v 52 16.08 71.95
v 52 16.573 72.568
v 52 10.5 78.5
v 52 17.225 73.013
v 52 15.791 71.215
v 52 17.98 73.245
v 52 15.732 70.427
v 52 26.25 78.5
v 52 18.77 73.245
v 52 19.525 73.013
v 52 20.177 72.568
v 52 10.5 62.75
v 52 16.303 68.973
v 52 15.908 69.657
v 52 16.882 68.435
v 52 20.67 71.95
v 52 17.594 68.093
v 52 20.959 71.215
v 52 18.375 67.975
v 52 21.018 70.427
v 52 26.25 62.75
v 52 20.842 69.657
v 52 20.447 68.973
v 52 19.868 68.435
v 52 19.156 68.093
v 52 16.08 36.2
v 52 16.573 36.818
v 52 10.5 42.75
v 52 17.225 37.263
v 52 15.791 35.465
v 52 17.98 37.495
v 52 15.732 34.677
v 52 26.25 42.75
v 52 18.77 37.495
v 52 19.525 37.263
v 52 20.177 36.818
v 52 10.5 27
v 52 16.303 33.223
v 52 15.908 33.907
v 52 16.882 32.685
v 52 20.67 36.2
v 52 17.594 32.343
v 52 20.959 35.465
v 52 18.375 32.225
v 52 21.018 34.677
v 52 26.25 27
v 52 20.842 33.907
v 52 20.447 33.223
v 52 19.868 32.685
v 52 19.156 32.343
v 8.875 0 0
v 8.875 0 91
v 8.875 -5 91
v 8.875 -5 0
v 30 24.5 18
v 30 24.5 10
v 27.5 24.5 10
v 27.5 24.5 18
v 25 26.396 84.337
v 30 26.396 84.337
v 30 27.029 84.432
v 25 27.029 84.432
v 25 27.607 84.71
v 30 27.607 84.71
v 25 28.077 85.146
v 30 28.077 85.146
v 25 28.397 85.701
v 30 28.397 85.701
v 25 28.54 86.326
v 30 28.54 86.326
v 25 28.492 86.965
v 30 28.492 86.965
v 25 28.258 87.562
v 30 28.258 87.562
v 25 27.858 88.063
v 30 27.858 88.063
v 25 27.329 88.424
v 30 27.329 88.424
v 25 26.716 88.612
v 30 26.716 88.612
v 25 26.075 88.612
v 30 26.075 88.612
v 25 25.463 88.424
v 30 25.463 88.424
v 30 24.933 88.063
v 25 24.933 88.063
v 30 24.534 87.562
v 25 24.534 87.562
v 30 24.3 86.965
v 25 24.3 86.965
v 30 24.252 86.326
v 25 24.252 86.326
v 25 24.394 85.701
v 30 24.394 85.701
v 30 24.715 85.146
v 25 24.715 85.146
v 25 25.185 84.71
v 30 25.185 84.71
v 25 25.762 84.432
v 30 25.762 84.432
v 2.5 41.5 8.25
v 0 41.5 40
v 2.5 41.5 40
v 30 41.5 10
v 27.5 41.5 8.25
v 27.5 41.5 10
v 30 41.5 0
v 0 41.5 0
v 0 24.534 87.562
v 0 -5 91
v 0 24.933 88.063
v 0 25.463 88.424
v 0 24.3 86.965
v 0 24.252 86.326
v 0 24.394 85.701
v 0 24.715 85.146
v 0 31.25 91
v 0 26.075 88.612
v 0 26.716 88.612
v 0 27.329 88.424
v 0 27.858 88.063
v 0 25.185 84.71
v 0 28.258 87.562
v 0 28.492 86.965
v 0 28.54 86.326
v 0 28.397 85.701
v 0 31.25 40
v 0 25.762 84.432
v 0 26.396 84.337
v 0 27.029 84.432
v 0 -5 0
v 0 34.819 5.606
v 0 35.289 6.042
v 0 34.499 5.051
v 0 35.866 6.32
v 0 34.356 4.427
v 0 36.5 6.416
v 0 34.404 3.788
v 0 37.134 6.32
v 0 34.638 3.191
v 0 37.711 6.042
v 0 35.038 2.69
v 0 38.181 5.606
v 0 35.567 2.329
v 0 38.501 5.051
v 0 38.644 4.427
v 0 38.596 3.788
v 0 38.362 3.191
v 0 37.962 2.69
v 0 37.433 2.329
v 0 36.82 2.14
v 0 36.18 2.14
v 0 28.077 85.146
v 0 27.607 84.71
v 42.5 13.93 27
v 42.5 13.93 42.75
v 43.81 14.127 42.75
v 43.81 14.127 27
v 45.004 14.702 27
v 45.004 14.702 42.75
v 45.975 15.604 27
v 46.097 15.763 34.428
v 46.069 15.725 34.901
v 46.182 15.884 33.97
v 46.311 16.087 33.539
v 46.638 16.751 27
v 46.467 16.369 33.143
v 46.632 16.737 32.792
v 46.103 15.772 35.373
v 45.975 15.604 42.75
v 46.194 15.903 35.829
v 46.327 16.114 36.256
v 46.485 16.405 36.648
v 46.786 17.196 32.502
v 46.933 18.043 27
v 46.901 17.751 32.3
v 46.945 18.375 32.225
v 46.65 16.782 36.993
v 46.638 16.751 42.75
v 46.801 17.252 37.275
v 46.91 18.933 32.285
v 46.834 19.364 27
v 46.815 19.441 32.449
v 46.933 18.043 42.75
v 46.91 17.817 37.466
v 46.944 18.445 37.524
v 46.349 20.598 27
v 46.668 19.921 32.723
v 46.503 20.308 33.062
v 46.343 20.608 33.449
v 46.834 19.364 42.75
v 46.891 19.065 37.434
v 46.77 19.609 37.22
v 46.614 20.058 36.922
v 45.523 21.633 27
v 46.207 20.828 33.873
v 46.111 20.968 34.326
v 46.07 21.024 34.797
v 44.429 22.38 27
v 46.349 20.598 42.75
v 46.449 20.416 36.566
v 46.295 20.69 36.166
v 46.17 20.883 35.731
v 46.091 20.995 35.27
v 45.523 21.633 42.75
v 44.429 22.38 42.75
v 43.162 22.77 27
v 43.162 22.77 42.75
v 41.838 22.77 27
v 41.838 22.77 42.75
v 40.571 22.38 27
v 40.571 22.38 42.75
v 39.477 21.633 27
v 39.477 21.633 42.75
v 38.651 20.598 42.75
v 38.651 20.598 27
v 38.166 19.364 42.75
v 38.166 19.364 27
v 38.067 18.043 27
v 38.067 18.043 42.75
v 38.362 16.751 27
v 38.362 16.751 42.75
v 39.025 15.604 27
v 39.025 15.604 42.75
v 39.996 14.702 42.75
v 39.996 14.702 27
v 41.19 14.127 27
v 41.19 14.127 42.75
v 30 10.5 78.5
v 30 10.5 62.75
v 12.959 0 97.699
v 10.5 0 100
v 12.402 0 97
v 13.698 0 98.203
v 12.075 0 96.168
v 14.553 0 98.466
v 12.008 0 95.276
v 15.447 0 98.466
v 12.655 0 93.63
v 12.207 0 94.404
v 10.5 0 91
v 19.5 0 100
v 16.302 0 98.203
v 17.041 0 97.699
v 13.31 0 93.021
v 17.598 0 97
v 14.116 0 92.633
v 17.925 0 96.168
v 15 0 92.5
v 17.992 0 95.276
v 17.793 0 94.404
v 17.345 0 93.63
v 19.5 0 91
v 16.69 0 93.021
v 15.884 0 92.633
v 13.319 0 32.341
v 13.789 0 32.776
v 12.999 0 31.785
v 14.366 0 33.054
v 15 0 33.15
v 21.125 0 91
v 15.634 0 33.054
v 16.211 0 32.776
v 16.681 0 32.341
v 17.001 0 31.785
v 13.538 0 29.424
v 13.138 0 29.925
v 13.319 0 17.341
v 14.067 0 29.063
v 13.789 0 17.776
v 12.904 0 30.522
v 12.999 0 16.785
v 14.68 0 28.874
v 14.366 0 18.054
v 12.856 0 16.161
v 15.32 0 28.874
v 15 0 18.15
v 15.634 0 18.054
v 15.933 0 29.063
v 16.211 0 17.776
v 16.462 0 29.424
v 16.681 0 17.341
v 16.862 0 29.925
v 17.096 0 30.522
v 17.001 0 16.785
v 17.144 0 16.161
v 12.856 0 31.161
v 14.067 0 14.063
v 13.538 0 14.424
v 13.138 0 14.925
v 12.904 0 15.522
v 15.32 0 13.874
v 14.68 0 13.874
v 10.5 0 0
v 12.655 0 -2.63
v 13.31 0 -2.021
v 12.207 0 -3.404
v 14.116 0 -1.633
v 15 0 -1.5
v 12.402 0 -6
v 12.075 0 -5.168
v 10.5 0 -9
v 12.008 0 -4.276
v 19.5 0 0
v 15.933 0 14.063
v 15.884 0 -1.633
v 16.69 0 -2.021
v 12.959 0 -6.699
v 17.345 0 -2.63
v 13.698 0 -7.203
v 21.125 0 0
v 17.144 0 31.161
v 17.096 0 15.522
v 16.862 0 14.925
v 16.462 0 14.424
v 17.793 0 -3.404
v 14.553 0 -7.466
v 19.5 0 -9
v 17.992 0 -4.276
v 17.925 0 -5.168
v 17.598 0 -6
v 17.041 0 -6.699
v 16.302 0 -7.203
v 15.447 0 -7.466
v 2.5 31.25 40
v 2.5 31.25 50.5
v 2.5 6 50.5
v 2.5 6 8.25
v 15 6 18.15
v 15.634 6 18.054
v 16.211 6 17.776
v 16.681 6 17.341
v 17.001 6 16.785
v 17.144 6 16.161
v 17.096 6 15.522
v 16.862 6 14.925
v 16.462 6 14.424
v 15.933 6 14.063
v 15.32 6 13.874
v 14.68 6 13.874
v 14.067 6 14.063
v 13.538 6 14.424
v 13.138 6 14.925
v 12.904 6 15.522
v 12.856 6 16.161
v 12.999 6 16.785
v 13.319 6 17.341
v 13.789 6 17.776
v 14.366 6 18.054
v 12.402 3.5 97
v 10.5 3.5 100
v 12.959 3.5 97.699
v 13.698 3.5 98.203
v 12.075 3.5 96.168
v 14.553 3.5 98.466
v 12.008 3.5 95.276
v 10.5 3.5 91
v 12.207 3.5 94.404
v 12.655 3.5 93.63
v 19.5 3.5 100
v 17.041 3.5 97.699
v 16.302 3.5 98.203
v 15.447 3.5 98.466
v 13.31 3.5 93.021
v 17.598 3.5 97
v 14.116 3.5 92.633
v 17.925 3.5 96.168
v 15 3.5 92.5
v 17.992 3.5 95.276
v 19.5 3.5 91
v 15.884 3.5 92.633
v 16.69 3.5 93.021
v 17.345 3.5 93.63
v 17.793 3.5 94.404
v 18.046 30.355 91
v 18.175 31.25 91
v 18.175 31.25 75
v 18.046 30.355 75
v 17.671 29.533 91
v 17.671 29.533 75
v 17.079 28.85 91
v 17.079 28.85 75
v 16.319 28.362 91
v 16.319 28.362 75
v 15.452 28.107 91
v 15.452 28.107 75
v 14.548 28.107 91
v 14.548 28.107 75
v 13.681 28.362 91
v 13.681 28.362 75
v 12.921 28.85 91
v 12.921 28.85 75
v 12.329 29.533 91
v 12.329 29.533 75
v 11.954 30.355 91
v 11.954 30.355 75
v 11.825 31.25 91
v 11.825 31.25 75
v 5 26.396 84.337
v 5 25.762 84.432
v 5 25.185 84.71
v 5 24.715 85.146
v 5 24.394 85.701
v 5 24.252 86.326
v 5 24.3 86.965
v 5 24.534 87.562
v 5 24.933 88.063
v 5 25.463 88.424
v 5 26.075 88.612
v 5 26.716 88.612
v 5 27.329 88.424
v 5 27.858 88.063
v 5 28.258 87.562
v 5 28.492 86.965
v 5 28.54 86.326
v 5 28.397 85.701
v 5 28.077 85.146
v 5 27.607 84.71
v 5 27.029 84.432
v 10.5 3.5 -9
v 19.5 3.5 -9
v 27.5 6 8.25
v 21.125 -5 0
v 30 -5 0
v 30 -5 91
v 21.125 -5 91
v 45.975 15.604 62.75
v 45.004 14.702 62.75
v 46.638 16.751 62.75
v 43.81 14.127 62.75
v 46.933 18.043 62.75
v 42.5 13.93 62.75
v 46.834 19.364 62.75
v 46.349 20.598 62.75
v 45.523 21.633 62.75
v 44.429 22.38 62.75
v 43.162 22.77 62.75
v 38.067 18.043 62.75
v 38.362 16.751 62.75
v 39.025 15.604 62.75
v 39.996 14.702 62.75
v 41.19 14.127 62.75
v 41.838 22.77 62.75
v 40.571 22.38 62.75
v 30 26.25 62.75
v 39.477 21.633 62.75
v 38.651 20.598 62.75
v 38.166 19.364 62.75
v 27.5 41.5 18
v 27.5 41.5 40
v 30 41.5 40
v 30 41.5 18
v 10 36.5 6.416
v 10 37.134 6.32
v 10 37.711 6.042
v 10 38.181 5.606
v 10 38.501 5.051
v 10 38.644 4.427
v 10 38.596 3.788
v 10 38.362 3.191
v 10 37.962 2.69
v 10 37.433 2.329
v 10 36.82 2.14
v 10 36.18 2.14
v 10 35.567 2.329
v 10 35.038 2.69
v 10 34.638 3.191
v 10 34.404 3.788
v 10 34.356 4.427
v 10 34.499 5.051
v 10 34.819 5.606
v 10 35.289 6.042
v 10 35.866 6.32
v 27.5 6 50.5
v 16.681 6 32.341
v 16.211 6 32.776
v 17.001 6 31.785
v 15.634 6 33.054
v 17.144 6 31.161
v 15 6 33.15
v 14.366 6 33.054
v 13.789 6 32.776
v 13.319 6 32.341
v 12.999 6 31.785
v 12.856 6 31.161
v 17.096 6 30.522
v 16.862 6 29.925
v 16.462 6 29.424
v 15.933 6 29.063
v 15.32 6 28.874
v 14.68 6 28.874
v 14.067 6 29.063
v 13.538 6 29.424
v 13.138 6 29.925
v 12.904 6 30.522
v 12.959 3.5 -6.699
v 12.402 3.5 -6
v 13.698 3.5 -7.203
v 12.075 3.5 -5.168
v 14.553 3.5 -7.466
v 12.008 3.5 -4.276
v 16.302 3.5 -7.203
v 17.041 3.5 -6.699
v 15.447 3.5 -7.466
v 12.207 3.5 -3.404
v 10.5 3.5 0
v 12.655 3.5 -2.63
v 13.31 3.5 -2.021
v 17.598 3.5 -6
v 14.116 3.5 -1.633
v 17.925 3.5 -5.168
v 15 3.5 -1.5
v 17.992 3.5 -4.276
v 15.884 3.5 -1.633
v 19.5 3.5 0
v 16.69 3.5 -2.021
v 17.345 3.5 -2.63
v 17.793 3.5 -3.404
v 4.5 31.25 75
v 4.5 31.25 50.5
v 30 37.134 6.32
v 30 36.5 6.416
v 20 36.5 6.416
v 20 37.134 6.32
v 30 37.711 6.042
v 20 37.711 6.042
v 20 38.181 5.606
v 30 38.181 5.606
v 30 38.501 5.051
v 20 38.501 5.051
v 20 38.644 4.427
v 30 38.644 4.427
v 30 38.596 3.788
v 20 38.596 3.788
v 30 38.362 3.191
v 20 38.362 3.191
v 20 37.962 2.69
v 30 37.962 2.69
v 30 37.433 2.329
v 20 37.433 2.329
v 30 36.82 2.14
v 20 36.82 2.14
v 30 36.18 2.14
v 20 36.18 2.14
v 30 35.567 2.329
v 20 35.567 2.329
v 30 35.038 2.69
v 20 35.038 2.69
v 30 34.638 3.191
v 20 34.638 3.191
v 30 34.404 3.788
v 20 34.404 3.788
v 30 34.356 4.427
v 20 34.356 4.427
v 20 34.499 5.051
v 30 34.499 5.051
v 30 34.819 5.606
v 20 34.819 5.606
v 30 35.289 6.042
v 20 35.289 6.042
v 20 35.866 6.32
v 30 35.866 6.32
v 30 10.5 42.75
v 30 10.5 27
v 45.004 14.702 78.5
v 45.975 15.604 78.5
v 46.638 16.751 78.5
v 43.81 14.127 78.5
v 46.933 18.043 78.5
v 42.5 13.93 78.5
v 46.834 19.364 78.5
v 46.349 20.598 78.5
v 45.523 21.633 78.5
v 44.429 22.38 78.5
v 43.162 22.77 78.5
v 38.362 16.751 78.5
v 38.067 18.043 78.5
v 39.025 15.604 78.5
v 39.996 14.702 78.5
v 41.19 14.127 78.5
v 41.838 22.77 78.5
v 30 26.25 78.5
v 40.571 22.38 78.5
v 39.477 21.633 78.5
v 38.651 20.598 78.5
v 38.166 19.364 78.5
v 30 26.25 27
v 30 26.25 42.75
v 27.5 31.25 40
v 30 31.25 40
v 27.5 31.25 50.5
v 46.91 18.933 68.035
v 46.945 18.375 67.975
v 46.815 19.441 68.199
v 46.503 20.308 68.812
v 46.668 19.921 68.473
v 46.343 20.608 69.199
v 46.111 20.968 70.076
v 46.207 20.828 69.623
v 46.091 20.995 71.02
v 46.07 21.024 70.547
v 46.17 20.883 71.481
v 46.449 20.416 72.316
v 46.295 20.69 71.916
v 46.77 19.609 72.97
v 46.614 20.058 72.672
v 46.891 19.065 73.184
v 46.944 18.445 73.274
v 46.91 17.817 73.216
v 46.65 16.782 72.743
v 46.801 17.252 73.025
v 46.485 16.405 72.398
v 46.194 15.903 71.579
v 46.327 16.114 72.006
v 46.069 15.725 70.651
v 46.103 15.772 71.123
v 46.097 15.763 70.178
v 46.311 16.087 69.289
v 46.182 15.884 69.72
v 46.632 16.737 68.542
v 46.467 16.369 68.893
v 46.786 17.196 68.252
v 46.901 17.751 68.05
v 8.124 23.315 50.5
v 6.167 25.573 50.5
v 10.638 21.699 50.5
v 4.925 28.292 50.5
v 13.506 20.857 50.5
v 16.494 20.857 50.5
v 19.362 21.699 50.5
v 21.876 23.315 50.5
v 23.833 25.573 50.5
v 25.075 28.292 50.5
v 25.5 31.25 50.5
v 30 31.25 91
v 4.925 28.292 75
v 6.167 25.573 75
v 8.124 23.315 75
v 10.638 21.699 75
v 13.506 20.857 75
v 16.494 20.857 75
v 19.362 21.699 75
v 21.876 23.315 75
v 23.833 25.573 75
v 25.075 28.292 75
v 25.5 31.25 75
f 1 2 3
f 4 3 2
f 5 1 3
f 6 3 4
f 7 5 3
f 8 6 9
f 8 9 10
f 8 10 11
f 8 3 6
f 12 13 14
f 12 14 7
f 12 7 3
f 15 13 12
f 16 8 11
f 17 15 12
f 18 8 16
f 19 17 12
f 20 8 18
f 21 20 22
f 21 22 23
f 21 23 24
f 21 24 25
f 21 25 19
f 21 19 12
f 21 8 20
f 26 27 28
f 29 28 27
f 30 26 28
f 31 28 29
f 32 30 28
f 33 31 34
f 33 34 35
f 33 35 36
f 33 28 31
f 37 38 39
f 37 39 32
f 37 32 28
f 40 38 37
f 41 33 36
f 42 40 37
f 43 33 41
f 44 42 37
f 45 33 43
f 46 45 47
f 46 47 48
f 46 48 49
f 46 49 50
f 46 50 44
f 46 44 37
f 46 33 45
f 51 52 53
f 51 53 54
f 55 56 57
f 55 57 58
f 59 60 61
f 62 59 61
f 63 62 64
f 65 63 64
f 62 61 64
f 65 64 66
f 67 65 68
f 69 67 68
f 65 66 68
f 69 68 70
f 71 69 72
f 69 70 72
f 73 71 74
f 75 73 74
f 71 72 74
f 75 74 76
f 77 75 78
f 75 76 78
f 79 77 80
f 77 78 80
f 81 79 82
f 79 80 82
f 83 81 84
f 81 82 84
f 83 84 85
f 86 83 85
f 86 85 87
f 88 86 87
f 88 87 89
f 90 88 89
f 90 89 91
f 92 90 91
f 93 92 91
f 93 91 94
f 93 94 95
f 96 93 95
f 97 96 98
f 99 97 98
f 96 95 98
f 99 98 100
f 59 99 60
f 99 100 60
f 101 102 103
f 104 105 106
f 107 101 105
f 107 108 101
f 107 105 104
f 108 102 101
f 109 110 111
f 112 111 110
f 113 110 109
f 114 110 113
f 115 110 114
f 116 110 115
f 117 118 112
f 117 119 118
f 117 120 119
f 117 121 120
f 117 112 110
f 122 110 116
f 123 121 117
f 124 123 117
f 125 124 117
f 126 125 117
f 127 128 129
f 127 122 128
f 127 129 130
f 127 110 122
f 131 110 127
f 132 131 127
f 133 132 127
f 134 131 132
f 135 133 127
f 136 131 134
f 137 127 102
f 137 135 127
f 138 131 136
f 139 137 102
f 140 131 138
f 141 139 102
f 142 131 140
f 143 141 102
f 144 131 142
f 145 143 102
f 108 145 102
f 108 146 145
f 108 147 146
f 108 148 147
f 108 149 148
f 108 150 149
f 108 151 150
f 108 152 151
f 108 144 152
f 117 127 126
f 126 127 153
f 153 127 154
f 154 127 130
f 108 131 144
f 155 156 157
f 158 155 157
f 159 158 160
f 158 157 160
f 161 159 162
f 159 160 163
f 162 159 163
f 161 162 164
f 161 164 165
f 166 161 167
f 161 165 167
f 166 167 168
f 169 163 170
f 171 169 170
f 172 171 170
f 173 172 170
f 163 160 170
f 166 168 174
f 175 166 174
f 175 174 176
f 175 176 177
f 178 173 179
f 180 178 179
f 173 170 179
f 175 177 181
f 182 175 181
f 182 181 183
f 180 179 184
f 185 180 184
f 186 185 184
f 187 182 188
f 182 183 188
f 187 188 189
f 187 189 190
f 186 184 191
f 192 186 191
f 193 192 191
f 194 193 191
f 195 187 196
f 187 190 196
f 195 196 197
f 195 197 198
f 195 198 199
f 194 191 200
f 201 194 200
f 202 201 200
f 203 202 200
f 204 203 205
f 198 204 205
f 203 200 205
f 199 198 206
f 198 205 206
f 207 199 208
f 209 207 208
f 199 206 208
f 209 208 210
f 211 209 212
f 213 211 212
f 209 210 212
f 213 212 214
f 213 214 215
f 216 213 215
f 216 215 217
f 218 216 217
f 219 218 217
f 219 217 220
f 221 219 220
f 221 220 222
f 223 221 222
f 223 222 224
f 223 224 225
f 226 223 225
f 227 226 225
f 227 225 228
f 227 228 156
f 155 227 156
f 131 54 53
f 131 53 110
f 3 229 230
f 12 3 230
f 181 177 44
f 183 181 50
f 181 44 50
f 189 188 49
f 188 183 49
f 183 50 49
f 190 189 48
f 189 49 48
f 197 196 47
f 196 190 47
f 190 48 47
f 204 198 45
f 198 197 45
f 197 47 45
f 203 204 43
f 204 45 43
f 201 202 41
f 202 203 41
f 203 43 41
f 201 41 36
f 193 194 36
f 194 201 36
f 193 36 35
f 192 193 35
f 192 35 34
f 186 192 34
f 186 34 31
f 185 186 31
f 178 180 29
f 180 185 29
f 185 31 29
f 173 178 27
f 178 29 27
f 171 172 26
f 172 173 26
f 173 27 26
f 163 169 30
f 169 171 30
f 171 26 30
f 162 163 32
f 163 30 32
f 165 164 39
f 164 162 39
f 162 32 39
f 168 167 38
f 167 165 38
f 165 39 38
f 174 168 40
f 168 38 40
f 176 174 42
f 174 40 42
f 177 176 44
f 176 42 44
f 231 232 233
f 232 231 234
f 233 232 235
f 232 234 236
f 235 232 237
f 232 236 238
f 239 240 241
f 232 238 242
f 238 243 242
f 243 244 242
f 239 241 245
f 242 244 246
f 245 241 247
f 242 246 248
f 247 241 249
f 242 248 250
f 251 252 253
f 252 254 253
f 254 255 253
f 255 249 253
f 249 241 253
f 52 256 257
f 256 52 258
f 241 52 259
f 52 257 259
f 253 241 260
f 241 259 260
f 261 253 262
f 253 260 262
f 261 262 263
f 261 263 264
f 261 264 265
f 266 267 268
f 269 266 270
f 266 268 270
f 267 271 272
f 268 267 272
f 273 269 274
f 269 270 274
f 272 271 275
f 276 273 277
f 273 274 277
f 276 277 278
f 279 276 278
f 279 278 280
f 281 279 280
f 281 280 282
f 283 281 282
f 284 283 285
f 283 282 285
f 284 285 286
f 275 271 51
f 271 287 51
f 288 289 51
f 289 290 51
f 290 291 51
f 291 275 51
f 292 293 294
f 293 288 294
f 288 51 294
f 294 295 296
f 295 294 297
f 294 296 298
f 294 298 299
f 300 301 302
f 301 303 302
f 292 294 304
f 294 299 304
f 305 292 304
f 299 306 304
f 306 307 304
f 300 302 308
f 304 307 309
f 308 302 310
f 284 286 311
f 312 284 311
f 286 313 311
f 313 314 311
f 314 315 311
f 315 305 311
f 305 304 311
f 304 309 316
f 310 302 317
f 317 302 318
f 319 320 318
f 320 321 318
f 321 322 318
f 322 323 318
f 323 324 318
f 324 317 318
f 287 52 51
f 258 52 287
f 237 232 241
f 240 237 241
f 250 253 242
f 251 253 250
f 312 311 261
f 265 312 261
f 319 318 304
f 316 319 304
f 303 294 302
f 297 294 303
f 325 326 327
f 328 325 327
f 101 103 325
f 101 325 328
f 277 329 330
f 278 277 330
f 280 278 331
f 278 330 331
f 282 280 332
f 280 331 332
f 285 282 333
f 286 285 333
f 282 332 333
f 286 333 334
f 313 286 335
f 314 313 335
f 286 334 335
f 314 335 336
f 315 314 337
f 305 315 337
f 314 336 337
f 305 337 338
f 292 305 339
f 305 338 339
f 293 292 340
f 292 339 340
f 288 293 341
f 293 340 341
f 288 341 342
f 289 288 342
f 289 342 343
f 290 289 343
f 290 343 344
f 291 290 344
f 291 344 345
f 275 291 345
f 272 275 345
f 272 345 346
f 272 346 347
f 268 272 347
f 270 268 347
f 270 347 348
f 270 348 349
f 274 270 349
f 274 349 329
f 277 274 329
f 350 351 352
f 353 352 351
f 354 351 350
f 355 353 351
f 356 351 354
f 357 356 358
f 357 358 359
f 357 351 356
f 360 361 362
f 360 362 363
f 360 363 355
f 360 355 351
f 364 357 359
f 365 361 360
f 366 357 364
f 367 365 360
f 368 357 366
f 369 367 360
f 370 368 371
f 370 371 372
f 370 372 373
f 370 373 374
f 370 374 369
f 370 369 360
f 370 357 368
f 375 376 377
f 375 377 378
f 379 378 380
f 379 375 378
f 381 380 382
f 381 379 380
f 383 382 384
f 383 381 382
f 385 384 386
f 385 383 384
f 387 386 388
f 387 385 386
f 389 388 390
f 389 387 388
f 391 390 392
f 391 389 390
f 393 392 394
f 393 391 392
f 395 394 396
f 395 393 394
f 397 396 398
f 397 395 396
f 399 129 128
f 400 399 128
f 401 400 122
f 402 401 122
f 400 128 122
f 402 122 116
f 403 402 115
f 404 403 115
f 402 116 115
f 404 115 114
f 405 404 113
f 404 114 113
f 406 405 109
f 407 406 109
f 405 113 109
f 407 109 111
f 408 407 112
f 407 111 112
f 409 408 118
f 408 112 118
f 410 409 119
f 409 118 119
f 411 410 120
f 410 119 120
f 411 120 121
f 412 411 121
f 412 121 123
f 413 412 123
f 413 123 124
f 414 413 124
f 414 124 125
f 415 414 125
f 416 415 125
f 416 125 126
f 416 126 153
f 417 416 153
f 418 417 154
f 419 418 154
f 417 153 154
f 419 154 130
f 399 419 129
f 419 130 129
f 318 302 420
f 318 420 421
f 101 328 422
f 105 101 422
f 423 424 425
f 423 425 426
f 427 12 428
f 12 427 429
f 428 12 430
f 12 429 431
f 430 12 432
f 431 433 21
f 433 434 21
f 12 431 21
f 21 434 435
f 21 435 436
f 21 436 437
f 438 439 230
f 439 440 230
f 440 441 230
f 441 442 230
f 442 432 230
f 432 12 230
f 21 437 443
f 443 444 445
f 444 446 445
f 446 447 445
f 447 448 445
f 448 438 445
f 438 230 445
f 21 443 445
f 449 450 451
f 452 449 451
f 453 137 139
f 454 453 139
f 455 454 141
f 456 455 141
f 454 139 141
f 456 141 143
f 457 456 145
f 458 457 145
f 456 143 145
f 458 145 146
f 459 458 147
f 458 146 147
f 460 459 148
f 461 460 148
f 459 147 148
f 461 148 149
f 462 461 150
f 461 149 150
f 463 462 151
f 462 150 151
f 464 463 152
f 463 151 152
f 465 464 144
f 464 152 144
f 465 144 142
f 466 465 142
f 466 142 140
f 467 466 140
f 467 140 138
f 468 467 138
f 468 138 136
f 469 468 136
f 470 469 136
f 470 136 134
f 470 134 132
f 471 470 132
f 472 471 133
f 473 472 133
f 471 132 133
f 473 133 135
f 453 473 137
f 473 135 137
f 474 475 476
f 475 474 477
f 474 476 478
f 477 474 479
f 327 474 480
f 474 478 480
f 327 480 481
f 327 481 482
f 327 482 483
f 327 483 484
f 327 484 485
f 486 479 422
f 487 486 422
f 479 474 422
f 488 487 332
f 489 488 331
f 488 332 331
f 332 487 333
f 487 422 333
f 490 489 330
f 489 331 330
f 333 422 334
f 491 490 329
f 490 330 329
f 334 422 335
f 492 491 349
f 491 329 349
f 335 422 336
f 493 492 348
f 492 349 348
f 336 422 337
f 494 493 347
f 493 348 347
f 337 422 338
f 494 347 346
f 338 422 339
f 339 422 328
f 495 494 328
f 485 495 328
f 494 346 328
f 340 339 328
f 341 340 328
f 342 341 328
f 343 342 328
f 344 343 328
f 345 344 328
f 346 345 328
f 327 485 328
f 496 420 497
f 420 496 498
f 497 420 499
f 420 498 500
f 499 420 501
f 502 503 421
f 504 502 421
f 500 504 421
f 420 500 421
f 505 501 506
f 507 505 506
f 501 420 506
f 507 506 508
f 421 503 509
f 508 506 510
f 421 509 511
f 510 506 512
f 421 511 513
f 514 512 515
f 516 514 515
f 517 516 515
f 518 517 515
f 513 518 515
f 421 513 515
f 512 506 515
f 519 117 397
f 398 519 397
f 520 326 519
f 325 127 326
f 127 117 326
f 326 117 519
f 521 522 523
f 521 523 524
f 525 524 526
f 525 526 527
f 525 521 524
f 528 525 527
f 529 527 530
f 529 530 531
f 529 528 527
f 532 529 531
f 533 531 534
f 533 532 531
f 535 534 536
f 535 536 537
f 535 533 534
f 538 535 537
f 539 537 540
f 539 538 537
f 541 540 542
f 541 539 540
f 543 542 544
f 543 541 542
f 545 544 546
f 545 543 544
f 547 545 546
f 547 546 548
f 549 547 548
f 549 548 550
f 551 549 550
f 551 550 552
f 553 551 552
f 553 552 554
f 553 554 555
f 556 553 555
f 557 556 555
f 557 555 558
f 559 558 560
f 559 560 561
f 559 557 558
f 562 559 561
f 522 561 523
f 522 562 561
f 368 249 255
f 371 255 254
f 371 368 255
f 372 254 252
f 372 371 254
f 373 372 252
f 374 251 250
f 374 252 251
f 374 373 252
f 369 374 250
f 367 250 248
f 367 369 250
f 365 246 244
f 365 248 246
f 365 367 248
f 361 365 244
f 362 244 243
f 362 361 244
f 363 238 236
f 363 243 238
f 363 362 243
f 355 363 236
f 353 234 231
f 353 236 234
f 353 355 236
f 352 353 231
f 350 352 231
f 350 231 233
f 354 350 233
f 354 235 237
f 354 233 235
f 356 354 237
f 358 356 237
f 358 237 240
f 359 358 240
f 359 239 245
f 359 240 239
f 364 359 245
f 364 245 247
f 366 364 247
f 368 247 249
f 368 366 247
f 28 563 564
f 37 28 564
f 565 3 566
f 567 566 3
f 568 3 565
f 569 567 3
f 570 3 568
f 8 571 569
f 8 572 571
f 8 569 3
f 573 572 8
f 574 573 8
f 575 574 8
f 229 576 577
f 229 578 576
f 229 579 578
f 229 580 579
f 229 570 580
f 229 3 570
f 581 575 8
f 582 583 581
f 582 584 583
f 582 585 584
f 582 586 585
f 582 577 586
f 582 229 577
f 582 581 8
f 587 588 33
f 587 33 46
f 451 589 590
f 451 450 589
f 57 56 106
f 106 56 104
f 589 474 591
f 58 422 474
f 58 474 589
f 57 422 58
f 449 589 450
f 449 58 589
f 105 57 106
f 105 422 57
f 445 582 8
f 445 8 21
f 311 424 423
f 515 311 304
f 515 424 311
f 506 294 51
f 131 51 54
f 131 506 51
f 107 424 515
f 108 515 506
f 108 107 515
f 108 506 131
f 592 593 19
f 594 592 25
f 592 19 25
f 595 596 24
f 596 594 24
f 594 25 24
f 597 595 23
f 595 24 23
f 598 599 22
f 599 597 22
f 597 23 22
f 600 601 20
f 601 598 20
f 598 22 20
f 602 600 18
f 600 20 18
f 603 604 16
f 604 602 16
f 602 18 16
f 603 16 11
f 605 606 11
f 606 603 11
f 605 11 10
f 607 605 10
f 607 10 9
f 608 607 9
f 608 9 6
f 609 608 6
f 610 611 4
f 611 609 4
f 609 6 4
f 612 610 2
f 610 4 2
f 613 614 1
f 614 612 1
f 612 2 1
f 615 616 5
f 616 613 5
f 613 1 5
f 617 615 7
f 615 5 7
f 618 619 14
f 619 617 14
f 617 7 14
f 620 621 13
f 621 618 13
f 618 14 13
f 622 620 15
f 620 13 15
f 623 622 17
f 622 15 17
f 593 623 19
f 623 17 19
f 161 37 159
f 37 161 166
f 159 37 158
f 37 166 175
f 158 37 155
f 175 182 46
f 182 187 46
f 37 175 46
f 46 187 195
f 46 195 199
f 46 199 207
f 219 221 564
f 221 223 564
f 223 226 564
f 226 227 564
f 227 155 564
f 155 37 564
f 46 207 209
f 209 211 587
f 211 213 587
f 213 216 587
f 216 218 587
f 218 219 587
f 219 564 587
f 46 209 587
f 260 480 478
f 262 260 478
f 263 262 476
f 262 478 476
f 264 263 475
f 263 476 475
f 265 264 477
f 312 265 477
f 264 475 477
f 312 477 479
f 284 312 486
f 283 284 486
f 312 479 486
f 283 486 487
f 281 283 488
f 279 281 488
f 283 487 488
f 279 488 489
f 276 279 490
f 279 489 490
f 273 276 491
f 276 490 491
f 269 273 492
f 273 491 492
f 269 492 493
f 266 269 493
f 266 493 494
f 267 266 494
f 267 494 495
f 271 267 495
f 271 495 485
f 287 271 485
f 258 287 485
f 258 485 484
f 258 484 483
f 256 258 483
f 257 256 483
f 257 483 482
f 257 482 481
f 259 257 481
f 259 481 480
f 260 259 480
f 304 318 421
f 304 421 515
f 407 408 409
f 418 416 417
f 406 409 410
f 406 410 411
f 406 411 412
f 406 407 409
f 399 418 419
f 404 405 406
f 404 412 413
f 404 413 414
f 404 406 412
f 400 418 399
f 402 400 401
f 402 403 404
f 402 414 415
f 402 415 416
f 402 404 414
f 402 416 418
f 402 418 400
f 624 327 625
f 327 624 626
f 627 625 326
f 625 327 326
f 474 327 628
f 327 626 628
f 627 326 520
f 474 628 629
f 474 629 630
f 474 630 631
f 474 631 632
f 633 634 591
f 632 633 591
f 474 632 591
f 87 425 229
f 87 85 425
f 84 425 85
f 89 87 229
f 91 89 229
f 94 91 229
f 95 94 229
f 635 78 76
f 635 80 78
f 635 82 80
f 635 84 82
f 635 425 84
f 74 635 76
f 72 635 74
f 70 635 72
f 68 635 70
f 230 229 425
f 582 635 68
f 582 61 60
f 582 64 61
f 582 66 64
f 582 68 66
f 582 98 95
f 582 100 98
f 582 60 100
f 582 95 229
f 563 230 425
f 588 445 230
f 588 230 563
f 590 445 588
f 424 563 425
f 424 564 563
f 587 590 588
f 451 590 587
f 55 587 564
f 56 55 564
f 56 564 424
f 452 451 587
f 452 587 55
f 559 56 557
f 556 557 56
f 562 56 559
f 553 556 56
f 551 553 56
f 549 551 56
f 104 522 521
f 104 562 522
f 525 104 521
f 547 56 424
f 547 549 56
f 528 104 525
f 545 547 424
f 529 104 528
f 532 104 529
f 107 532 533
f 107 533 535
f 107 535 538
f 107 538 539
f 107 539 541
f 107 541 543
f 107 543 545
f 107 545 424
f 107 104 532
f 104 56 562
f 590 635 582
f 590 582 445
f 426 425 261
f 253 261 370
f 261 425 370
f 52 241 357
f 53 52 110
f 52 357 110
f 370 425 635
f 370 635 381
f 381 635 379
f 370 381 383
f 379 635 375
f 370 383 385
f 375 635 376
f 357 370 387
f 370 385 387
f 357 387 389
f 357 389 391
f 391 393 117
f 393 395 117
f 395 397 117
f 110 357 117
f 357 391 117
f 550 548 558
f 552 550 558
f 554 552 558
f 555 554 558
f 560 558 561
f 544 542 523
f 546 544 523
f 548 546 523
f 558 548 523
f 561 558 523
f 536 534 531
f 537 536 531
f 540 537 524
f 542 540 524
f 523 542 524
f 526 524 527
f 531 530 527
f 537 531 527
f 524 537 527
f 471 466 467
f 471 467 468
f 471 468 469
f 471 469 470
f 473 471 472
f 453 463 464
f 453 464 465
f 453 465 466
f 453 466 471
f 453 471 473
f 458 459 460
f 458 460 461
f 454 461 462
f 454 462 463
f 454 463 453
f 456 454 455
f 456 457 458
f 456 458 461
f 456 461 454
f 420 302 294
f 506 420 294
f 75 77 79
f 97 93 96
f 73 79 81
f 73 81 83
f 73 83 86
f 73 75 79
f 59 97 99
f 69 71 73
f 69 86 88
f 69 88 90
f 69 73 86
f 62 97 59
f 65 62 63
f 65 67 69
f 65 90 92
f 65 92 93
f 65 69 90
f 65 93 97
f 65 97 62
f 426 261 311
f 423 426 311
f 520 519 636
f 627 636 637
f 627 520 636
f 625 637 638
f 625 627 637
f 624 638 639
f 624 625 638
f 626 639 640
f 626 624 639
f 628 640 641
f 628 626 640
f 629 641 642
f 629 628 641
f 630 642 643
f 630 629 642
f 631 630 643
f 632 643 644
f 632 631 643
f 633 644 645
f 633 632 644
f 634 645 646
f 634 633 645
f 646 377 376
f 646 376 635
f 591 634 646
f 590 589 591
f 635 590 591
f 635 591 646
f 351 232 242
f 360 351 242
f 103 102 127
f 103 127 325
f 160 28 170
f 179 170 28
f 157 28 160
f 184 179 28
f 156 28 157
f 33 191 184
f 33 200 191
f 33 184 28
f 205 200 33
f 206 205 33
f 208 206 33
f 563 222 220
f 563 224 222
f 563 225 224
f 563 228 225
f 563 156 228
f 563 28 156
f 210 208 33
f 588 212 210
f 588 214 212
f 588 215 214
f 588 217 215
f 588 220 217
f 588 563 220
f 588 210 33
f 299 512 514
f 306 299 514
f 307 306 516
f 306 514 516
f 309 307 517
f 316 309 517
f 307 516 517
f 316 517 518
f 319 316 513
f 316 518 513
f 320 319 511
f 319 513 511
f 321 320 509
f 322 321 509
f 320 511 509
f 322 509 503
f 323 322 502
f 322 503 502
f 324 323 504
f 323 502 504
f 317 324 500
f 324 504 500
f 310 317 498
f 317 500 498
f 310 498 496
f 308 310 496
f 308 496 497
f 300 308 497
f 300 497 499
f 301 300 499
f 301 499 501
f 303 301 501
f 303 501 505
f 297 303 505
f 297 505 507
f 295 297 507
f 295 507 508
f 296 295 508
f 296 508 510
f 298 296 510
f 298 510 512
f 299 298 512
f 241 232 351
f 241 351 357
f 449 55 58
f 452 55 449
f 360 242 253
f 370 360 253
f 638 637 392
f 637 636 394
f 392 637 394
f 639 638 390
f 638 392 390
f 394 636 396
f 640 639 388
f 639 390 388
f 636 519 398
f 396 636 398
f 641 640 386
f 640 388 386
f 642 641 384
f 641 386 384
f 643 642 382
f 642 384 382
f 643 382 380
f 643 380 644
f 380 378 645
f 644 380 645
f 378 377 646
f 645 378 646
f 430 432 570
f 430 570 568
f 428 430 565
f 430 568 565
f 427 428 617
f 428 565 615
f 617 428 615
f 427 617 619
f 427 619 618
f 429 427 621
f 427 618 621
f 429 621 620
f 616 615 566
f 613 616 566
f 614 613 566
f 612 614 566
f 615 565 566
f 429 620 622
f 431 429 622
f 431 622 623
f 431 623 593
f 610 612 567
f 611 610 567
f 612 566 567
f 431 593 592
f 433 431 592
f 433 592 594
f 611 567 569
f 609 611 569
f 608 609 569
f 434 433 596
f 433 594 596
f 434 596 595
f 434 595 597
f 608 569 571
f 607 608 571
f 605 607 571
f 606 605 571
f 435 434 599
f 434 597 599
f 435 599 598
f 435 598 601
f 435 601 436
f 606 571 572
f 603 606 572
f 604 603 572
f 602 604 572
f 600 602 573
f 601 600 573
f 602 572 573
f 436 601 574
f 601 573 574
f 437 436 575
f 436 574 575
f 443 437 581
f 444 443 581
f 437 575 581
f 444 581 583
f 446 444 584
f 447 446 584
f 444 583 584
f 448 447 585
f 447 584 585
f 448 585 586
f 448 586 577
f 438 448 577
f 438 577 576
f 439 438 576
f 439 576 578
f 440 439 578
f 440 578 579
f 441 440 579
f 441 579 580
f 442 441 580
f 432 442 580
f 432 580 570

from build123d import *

# Parameters (mm, degrees)
SKETCH1_W                = 30
SKETCH1_H                = 41.5
BOSS_EXTRUDE1_DEPTH      = 40
SKETCH2_W                = 25
SKETCH2_H                = 29
CUT_EXTRUDE1_DEPTH       = 35.5
SKETCH3_W                = 25
SKETCH3_H                = 35.5
CUT_EXTRUDE2_DEPTH       = 19
SKETCH7_W                = 9
SKETCH7_H                = 9
BOSS_EXTRUDE2_DEPTH      = 3.5
SKETCH8_R                = 3
CUT_EXTRUDE3_DEPTH       = 7
BOSS_EXTRUDE3_DEPTH      = 35
SKETCH10_W               = 30
SKETCH10_H               = 31.25
BOSS_EXTRUDE4_DEPTH      = 16
CUT_EXTRUDE4_DEPTH       = 25
SKETCH12_W               = 8
SKETCH12_H               = 17
CUT_EXTRUDE5_DEPTH       = 2.5
SKETCH13_R               = 2.15
CUT_EXTRUDE6_DEPTH       = 10
SKETCH17_W               = 15.75
SKETCH17_H               = 15.75
BOSS_EXTRUDE5_DEPTH      = 22
SKETCH18_R               = 4.445
CUT_EXTRUDE7_DEPTH       = 62.75
SKETCH19_R               = 2.15
CUT_EXTRUDE8_DEPTH       = 5
SKETCH21_R               = 2.15
CUT_EXTRUDE9_DEPTH       = 5
SKETCH23_W               = 8.875
SKETCH23_H               = 91
BOSS_EXTRUDE6_DEPTH      = 5
CUT_EXTRUDE10_REACH      = 122.109
CUT_EXTRUDE10_END_RADIUS = 4.445
SKETCH25_R               = 2.15
CUT_EXTRUDE11_DEPTH      = 119.170427817
SKETCH26_W               = 25
SKETCH26_H               = 2.5
CUT_EXTRUDE12_DEPTH      = 25.25
SKETCH27_W               = 25
SKETCH27_H               = 8
CUT_EXTRUDE13_DEPTH      = 25.25


with BuildPart() as part:
    # Sketch1 → Boss-Extrude1 (new body)
    with BuildSketch(Plane.XY):
        with Locations((15, 20.75)):
            Rectangle(SKETCH1_W, SKETCH1_H)
    extrude(amount=BOSS_EXTRUDE1_DEPTH)

    # Sketch2 → Cut-Extrude1 (cut)
    with BuildSketch(Plane(origin=(0, 41.5, 0), x_dir=(1, 0, 0), z_dir=(0, 1, 0))):
        with Locations((15, -22.75)):
            Rectangle(SKETCH2_W, SKETCH2_H)
    extrude(amount=-CUT_EXTRUDE1_DEPTH, mode=Mode.SUBTRACT)

    # Sketch3 → Cut-Extrude2 (cut)
    with BuildSketch(Plane(origin=(0, 0, 37.25), x_dir=(-1, 0, 0), z_dir=(0, 0, -1))):
        with Locations((-15, 23.75)):
            Rectangle(SKETCH3_W, SKETCH3_H)
    extrude(amount=-CUT_EXTRUDE2_DEPTH, mode=Mode.SUBTRACT)

    # Sketch7 → Boss-Extrude2 (add)
    with BuildSketch(Plane.XZ):
        with Locations((15, -4.5)):
            Rectangle(SKETCH7_W, SKETCH7_H)
    boss_extrude2 = extrude(amount=-BOSS_EXTRUDE2_DEPTH)

    # Sketch8 → Cut-Extrude3 (cut)
    with BuildSketch(Plane(origin=(0, 3.5, 0), x_dir=(1, 0, 0), z_dir=(0, 1, 0))):
        with Locations(Location((15, 4.5, 0), (0, 0, 270))):
            Circle(SKETCH8_R)
    cut_extrude3 = extrude(amount=-CUT_EXTRUDE3_DEPTH, mode=Mode.SUBTRACT)

    # Sketch9 → Boss-Extrude3 (add)
    with BuildSketch(Plane.XY.offset(40)):
        with BuildLine():
            Line((0, 0), (0, 31.25))
            Line((0, 31.25), (4.5, 31.25))
            ThreePointArc((4.5, 31.25), (15, 20.75), (25.5, 31.25))
            Line((25.5, 31.25), (30, 31.25))
            Line((30, 31.25), (30, 0))
            Line((30, 0), (0, 0))
        make_face()
    extrude(amount=BOSS_EXTRUDE3_DEPTH)

    # Sketch10 → Boss-Extrude4 (add)
    with BuildSketch(Plane.XY.offset(75)):
        with Locations((15, 15.625)):
            Rectangle(SKETCH10_W, SKETCH10_H)
    extrude(amount=BOSS_EXTRUDE4_DEPTH)

    # Mirror1: Boss-Extrude2, Cut-Extrude3 across plane
    add(boss_extrude2.mirror(Plane.XY.offset(45.5)))
    add(cut_extrude3.mirror(Plane.XY.offset(45.5)), mode=Mode.SUBTRACT)

    # Sketch11 → Cut-Extrude4 (cut)
    with BuildSketch(Plane.XY.offset(91)):
        with BuildLine():
            Line((11.825, 31.25), (18.175, 31.25))
            ThreePointArc((18.175, 31.25), (15, 28.075), (11.825, 31.25))
        make_face()
    extrude(amount=-CUT_EXTRUDE4_DEPTH, mode=Mode.SUBTRACT)

    # Sketch12 → Cut-Extrude5 (cut)
    with BuildSketch(Plane.ZY.offset(-30)):
        with Locations((14, 33)):
            Rectangle(SKETCH12_W, SKETCH12_H)
    extrude(amount=CUT_EXTRUDE5_DEPTH, mode=Mode.SUBTRACT)

    # Sketch13 → Cut-Extrude6 (cut)
    with BuildSketch(Plane.ZY):
        with Locations((4.265954999, 36.5)):
            Circle(SKETCH13_R)
    cut_extrude6 = extrude(amount=-CUT_EXTRUDE6_DEPTH, mode=Mode.SUBTRACT)

    # Mirror2: Cut-Extrude6 across plane
    add(cut_extrude6.mirror(Plane(origin=(15, 0, 0), x_dir=(0, 0, 1), z_dir=(1, 0, 0))), mode=Mode.SUBTRACT)

    # Sketch17 → Boss-Extrude5 (add)
    with BuildSketch(Plane(origin=(30, 0, 0), x_dir=(0, 0, -1), z_dir=(1, 0, 0))):
        with Locations((-70.625, 18.375)):
            Rectangle(SKETCH17_W, SKETCH17_H)
        with Locations((-34.875, 18.375)):
            Rectangle(SKETCH17_W, SKETCH17_H)
    extrude(amount=BOSS_EXTRUDE5_DEPTH)

    # Sketch18 → Cut-Extrude7 (cut)
    with BuildSketch(Plane.XY.offset(78.5)):
        with Locations(Location((42.5, 18.375, 0), (0, 0, 270))):
            Circle(SKETCH18_R)
    extrude(amount=-CUT_EXTRUDE7_DEPTH, mode=Mode.SUBTRACT)

    # Sketch19 → Cut-Extrude8 (cut)
    with BuildSketch(Plane(origin=(30, 0, 0), x_dir=(0, 0, -1), z_dir=(1, 0, 0))):
        with Locations((-86.486504599, 26.395706225)):
            Circle(SKETCH19_R)
    extrude(amount=-CUT_EXTRUDE8_DEPTH, mode=Mode.SUBTRACT)

    # Sketch21 → Cut-Extrude9 (cut)
    with BuildSketch(Plane.ZY):
        with Locations(Location((86.486504599, 26.395706225, 0), (0, 0, 180))):
            Circle(SKETCH21_R)
    extrude(amount=-CUT_EXTRUDE9_DEPTH, mode=Mode.SUBTRACT)

    # Sketch23 → Boss-Extrude6 (add)
    with BuildSketch(Plane(origin=(0, 0, 0), x_dir=(-1, 0, 0), z_dir=(0, -1, 0))):
        with Locations((-25.5625, -45.5)):
            Rectangle(SKETCH23_W, SKETCH23_H)
        with Locations((-4.4375, -45.5)):
            Rectangle(SKETCH23_W, SKETCH23_H)
    extrude(amount=BOSS_EXTRUDE6_DEPTH)

    # Cut-Extrude10: up to this cylinder (the profile starts outside it)
    cut_extrude10_end = Plane(origin=(42.5, 18.375, 52.75), z_dir=(0, 0, 1)) * Cylinder(CUT_EXTRUDE10_END_RADIUS, 289.858, mode=Mode.PRIVATE)
    # Sketch24 → Cut-Extrude10 (cut, up to the surface)
    with BuildSketch(Plane(origin=(52, 0, 0), x_dir=(0, 0, -1), z_dir=(1, 0, 0)), mode=Mode.PRIVATE) as cut_extrude10_sk1:
        with BuildLine():
            ThreePointArc((-67.975, 18.375), (-70.625, 21.025), (-73.275, 18.375))
            Line((-73.275, 18.375), (-67.975, 18.375))
        make_face()
    cut_extrude10_tool1 = extrude(cut_extrude10_sk1.sketch, amount=-CUT_EXTRUDE10_REACH, mode=Mode.PRIVATE) - cut_extrude10_end
    add(cut_extrude10_tool1.solids().sort_by_distance((52, 19.499695, 70.625))[0], mode=Mode.SUBTRACT)
    # Sketch24 → Cut-Extrude10 (cut, up to the surface)
    with BuildSketch(Plane(origin=(52, 0, 0), x_dir=(0, 0, -1), z_dir=(1, 0, 0)), mode=Mode.PRIVATE) as cut_extrude10_sk2:
        with BuildLine():
            Line((-67.975, 18.375), (-73.275, 18.375))
            ThreePointArc((-73.275, 18.375), (-70.625, 15.725), (-67.975, 18.375))
        make_face()
    cut_extrude10_tool2 = extrude(cut_extrude10_sk2.sketch, amount=-CUT_EXTRUDE10_REACH, mode=Mode.PRIVATE) - cut_extrude10_end
    add(cut_extrude10_tool2.solids().sort_by_distance((52, 17.250305, 70.625))[0], mode=Mode.SUBTRACT)
    # Sketch24 → Cut-Extrude10 (cut, up to the surface)
    with BuildSketch(Plane(origin=(52, 0, 0), x_dir=(0, 0, -1), z_dir=(1, 0, 0)), mode=Mode.PRIVATE) as cut_extrude10_sk3:
        with BuildLine():
            ThreePointArc((-32.225, 18.375), (-34.875, 21.025), (-37.525, 18.375))
            Line((-37.525, 18.375), (-32.225, 18.375))
        make_face()
    cut_extrude10_tool3 = extrude(cut_extrude10_sk3.sketch, amount=-CUT_EXTRUDE10_REACH, mode=Mode.PRIVATE) - cut_extrude10_end
    add(cut_extrude10_tool3.solids().sort_by_distance((52, 19.499695, 34.875))[0], mode=Mode.SUBTRACT)
    # Sketch24 → Cut-Extrude10 (cut, up to the surface)
    with BuildSketch(Plane(origin=(52, 0, 0), x_dir=(0, 0, -1), z_dir=(1, 0, 0)), mode=Mode.PRIVATE) as cut_extrude10_sk4:
        with BuildLine():
            Line((-32.225, 18.375), (-37.525, 18.375))
            ThreePointArc((-37.525, 18.375), (-34.875, 15.725), (-32.225, 18.375))
        make_face()
    cut_extrude10_tool4 = extrude(cut_extrude10_sk4.sketch, amount=-CUT_EXTRUDE10_REACH, mode=Mode.PRIVATE) - cut_extrude10_end
    add(cut_extrude10_tool4.solids().sort_by_distance((52, 17.250305, 34.875))[0], mode=Mode.SUBTRACT)
    # Sketch24 → Cut-Extrude10 (cut, up to the surface)
    with BuildSketch(Plane(origin=(52, 0, 0), x_dir=(0, 0, -1), z_dir=(1, 0, 0)), mode=Mode.PRIVATE) as cut_extrude10_sk5:
        with BuildLine():
            ThreePointArc((-32.225, 18.375), (-34.875, 21.025), (-37.525, 18.375))
            Line((-37.525, 18.375), (-32.225, 18.375))
        make_face()
    cut_extrude10_tool5 = extrude(cut_extrude10_sk5.sketch, amount=-CUT_EXTRUDE10_REACH, mode=Mode.PRIVATE) - cut_extrude10_end
    add(cut_extrude10_tool5.solids().sort_by_distance((52, 19.499695, 34.875))[0], mode=Mode.SUBTRACT)
    # Sketch24 → Cut-Extrude10 (cut, up to the surface)
    with BuildSketch(Plane(origin=(52, 0, 0), x_dir=(0, 0, -1), z_dir=(1, 0, 0)), mode=Mode.PRIVATE) as cut_extrude10_sk6:
        with BuildLine():
            Line((-32.225, 18.375), (-37.525, 18.375))
            ThreePointArc((-37.525, 18.375), (-34.875, 15.725), (-32.225, 18.375))
        make_face()
    cut_extrude10_tool6 = extrude(cut_extrude10_sk6.sketch, amount=-CUT_EXTRUDE10_REACH, mode=Mode.PRIVATE) - cut_extrude10_end
    add(cut_extrude10_tool6.solids().sort_by_distance((52, 17.250305, 34.875))[0], mode=Mode.SUBTRACT)
    # Sketch24 → Cut-Extrude10 (cut, up to the surface)
    with BuildSketch(Plane(origin=(52, 0, 0), x_dir=(0, 0, -1), z_dir=(1, 0, 0)), mode=Mode.PRIVATE) as cut_extrude10_sk7:
        with BuildLine():
            ThreePointArc((-67.975, 18.375), (-70.625, 21.025), (-73.275, 18.375))
            Line((-73.275, 18.375), (-67.975, 18.375))
        make_face()
    cut_extrude10_tool7 = extrude(cut_extrude10_sk7.sketch, amount=-CUT_EXTRUDE10_REACH, mode=Mode.PRIVATE) - cut_extrude10_end
    add(cut_extrude10_tool7.solids().sort_by_distance((52, 19.499695, 70.625))[0], mode=Mode.SUBTRACT)
    # Sketch24 → Cut-Extrude10 (cut, up to the surface)
    with BuildSketch(Plane(origin=(52, 0, 0), x_dir=(0, 0, -1), z_dir=(1, 0, 0)), mode=Mode.PRIVATE) as cut_extrude10_sk8:
        with BuildLine():
            Line((-67.975, 18.375), (-73.275, 18.375))
            ThreePointArc((-73.275, 18.375), (-70.625, 15.725), (-67.975, 18.375))
        make_face()
    cut_extrude10_tool8 = extrude(cut_extrude10_sk8.sketch, amount=-CUT_EXTRUDE10_REACH, mode=Mode.PRIVATE) - cut_extrude10_end
    add(cut_extrude10_tool8.solids().sort_by_distance((52, 17.250305, 70.625))[0], mode=Mode.SUBTRACT)

    # Sketch25 → Cut-Extrude11 (cut, through all)
    with BuildSketch(Plane(origin=(0, 6, 0), x_dir=(1, 0, 0), z_dir=(0, 1, 0))):
        with Locations(Location((15, -16, 0), (0, 0, 270))):
            Circle(SKETCH25_R)
        with Locations(Location((15, -31, 0), (0, 0, 270))):
            Circle(SKETCH25_R)
    extrude(amount=-CUT_EXTRUDE11_DEPTH, mode=Mode.SUBTRACT)

    # Sketch26 → Cut-Extrude12 (cut)
    with BuildSketch(Plane(origin=(0, 31.25, 0), x_dir=(1, 0, 0), z_dir=(0, 1, 0))):
        with Locations((15, -41.25)):
            Rectangle(SKETCH26_W, SKETCH26_H)
    extrude(amount=-CUT_EXTRUDE12_DEPTH, mode=Mode.SUBTRACT)

    # Sketch27 → Cut-Extrude13 (cut)
    with BuildSketch(Plane(origin=(0, 31.25, 0), x_dir=(1, 0, 0), z_dir=(0, 1, 0))):
        with Locations((15, -46.5)):
            Rectangle(SKETCH27_W, SKETCH27_H)
    extrude(amount=-CUT_EXTRUDE13_DEPTH, mode=Mode.SUBTRACT)


solid = part.part
